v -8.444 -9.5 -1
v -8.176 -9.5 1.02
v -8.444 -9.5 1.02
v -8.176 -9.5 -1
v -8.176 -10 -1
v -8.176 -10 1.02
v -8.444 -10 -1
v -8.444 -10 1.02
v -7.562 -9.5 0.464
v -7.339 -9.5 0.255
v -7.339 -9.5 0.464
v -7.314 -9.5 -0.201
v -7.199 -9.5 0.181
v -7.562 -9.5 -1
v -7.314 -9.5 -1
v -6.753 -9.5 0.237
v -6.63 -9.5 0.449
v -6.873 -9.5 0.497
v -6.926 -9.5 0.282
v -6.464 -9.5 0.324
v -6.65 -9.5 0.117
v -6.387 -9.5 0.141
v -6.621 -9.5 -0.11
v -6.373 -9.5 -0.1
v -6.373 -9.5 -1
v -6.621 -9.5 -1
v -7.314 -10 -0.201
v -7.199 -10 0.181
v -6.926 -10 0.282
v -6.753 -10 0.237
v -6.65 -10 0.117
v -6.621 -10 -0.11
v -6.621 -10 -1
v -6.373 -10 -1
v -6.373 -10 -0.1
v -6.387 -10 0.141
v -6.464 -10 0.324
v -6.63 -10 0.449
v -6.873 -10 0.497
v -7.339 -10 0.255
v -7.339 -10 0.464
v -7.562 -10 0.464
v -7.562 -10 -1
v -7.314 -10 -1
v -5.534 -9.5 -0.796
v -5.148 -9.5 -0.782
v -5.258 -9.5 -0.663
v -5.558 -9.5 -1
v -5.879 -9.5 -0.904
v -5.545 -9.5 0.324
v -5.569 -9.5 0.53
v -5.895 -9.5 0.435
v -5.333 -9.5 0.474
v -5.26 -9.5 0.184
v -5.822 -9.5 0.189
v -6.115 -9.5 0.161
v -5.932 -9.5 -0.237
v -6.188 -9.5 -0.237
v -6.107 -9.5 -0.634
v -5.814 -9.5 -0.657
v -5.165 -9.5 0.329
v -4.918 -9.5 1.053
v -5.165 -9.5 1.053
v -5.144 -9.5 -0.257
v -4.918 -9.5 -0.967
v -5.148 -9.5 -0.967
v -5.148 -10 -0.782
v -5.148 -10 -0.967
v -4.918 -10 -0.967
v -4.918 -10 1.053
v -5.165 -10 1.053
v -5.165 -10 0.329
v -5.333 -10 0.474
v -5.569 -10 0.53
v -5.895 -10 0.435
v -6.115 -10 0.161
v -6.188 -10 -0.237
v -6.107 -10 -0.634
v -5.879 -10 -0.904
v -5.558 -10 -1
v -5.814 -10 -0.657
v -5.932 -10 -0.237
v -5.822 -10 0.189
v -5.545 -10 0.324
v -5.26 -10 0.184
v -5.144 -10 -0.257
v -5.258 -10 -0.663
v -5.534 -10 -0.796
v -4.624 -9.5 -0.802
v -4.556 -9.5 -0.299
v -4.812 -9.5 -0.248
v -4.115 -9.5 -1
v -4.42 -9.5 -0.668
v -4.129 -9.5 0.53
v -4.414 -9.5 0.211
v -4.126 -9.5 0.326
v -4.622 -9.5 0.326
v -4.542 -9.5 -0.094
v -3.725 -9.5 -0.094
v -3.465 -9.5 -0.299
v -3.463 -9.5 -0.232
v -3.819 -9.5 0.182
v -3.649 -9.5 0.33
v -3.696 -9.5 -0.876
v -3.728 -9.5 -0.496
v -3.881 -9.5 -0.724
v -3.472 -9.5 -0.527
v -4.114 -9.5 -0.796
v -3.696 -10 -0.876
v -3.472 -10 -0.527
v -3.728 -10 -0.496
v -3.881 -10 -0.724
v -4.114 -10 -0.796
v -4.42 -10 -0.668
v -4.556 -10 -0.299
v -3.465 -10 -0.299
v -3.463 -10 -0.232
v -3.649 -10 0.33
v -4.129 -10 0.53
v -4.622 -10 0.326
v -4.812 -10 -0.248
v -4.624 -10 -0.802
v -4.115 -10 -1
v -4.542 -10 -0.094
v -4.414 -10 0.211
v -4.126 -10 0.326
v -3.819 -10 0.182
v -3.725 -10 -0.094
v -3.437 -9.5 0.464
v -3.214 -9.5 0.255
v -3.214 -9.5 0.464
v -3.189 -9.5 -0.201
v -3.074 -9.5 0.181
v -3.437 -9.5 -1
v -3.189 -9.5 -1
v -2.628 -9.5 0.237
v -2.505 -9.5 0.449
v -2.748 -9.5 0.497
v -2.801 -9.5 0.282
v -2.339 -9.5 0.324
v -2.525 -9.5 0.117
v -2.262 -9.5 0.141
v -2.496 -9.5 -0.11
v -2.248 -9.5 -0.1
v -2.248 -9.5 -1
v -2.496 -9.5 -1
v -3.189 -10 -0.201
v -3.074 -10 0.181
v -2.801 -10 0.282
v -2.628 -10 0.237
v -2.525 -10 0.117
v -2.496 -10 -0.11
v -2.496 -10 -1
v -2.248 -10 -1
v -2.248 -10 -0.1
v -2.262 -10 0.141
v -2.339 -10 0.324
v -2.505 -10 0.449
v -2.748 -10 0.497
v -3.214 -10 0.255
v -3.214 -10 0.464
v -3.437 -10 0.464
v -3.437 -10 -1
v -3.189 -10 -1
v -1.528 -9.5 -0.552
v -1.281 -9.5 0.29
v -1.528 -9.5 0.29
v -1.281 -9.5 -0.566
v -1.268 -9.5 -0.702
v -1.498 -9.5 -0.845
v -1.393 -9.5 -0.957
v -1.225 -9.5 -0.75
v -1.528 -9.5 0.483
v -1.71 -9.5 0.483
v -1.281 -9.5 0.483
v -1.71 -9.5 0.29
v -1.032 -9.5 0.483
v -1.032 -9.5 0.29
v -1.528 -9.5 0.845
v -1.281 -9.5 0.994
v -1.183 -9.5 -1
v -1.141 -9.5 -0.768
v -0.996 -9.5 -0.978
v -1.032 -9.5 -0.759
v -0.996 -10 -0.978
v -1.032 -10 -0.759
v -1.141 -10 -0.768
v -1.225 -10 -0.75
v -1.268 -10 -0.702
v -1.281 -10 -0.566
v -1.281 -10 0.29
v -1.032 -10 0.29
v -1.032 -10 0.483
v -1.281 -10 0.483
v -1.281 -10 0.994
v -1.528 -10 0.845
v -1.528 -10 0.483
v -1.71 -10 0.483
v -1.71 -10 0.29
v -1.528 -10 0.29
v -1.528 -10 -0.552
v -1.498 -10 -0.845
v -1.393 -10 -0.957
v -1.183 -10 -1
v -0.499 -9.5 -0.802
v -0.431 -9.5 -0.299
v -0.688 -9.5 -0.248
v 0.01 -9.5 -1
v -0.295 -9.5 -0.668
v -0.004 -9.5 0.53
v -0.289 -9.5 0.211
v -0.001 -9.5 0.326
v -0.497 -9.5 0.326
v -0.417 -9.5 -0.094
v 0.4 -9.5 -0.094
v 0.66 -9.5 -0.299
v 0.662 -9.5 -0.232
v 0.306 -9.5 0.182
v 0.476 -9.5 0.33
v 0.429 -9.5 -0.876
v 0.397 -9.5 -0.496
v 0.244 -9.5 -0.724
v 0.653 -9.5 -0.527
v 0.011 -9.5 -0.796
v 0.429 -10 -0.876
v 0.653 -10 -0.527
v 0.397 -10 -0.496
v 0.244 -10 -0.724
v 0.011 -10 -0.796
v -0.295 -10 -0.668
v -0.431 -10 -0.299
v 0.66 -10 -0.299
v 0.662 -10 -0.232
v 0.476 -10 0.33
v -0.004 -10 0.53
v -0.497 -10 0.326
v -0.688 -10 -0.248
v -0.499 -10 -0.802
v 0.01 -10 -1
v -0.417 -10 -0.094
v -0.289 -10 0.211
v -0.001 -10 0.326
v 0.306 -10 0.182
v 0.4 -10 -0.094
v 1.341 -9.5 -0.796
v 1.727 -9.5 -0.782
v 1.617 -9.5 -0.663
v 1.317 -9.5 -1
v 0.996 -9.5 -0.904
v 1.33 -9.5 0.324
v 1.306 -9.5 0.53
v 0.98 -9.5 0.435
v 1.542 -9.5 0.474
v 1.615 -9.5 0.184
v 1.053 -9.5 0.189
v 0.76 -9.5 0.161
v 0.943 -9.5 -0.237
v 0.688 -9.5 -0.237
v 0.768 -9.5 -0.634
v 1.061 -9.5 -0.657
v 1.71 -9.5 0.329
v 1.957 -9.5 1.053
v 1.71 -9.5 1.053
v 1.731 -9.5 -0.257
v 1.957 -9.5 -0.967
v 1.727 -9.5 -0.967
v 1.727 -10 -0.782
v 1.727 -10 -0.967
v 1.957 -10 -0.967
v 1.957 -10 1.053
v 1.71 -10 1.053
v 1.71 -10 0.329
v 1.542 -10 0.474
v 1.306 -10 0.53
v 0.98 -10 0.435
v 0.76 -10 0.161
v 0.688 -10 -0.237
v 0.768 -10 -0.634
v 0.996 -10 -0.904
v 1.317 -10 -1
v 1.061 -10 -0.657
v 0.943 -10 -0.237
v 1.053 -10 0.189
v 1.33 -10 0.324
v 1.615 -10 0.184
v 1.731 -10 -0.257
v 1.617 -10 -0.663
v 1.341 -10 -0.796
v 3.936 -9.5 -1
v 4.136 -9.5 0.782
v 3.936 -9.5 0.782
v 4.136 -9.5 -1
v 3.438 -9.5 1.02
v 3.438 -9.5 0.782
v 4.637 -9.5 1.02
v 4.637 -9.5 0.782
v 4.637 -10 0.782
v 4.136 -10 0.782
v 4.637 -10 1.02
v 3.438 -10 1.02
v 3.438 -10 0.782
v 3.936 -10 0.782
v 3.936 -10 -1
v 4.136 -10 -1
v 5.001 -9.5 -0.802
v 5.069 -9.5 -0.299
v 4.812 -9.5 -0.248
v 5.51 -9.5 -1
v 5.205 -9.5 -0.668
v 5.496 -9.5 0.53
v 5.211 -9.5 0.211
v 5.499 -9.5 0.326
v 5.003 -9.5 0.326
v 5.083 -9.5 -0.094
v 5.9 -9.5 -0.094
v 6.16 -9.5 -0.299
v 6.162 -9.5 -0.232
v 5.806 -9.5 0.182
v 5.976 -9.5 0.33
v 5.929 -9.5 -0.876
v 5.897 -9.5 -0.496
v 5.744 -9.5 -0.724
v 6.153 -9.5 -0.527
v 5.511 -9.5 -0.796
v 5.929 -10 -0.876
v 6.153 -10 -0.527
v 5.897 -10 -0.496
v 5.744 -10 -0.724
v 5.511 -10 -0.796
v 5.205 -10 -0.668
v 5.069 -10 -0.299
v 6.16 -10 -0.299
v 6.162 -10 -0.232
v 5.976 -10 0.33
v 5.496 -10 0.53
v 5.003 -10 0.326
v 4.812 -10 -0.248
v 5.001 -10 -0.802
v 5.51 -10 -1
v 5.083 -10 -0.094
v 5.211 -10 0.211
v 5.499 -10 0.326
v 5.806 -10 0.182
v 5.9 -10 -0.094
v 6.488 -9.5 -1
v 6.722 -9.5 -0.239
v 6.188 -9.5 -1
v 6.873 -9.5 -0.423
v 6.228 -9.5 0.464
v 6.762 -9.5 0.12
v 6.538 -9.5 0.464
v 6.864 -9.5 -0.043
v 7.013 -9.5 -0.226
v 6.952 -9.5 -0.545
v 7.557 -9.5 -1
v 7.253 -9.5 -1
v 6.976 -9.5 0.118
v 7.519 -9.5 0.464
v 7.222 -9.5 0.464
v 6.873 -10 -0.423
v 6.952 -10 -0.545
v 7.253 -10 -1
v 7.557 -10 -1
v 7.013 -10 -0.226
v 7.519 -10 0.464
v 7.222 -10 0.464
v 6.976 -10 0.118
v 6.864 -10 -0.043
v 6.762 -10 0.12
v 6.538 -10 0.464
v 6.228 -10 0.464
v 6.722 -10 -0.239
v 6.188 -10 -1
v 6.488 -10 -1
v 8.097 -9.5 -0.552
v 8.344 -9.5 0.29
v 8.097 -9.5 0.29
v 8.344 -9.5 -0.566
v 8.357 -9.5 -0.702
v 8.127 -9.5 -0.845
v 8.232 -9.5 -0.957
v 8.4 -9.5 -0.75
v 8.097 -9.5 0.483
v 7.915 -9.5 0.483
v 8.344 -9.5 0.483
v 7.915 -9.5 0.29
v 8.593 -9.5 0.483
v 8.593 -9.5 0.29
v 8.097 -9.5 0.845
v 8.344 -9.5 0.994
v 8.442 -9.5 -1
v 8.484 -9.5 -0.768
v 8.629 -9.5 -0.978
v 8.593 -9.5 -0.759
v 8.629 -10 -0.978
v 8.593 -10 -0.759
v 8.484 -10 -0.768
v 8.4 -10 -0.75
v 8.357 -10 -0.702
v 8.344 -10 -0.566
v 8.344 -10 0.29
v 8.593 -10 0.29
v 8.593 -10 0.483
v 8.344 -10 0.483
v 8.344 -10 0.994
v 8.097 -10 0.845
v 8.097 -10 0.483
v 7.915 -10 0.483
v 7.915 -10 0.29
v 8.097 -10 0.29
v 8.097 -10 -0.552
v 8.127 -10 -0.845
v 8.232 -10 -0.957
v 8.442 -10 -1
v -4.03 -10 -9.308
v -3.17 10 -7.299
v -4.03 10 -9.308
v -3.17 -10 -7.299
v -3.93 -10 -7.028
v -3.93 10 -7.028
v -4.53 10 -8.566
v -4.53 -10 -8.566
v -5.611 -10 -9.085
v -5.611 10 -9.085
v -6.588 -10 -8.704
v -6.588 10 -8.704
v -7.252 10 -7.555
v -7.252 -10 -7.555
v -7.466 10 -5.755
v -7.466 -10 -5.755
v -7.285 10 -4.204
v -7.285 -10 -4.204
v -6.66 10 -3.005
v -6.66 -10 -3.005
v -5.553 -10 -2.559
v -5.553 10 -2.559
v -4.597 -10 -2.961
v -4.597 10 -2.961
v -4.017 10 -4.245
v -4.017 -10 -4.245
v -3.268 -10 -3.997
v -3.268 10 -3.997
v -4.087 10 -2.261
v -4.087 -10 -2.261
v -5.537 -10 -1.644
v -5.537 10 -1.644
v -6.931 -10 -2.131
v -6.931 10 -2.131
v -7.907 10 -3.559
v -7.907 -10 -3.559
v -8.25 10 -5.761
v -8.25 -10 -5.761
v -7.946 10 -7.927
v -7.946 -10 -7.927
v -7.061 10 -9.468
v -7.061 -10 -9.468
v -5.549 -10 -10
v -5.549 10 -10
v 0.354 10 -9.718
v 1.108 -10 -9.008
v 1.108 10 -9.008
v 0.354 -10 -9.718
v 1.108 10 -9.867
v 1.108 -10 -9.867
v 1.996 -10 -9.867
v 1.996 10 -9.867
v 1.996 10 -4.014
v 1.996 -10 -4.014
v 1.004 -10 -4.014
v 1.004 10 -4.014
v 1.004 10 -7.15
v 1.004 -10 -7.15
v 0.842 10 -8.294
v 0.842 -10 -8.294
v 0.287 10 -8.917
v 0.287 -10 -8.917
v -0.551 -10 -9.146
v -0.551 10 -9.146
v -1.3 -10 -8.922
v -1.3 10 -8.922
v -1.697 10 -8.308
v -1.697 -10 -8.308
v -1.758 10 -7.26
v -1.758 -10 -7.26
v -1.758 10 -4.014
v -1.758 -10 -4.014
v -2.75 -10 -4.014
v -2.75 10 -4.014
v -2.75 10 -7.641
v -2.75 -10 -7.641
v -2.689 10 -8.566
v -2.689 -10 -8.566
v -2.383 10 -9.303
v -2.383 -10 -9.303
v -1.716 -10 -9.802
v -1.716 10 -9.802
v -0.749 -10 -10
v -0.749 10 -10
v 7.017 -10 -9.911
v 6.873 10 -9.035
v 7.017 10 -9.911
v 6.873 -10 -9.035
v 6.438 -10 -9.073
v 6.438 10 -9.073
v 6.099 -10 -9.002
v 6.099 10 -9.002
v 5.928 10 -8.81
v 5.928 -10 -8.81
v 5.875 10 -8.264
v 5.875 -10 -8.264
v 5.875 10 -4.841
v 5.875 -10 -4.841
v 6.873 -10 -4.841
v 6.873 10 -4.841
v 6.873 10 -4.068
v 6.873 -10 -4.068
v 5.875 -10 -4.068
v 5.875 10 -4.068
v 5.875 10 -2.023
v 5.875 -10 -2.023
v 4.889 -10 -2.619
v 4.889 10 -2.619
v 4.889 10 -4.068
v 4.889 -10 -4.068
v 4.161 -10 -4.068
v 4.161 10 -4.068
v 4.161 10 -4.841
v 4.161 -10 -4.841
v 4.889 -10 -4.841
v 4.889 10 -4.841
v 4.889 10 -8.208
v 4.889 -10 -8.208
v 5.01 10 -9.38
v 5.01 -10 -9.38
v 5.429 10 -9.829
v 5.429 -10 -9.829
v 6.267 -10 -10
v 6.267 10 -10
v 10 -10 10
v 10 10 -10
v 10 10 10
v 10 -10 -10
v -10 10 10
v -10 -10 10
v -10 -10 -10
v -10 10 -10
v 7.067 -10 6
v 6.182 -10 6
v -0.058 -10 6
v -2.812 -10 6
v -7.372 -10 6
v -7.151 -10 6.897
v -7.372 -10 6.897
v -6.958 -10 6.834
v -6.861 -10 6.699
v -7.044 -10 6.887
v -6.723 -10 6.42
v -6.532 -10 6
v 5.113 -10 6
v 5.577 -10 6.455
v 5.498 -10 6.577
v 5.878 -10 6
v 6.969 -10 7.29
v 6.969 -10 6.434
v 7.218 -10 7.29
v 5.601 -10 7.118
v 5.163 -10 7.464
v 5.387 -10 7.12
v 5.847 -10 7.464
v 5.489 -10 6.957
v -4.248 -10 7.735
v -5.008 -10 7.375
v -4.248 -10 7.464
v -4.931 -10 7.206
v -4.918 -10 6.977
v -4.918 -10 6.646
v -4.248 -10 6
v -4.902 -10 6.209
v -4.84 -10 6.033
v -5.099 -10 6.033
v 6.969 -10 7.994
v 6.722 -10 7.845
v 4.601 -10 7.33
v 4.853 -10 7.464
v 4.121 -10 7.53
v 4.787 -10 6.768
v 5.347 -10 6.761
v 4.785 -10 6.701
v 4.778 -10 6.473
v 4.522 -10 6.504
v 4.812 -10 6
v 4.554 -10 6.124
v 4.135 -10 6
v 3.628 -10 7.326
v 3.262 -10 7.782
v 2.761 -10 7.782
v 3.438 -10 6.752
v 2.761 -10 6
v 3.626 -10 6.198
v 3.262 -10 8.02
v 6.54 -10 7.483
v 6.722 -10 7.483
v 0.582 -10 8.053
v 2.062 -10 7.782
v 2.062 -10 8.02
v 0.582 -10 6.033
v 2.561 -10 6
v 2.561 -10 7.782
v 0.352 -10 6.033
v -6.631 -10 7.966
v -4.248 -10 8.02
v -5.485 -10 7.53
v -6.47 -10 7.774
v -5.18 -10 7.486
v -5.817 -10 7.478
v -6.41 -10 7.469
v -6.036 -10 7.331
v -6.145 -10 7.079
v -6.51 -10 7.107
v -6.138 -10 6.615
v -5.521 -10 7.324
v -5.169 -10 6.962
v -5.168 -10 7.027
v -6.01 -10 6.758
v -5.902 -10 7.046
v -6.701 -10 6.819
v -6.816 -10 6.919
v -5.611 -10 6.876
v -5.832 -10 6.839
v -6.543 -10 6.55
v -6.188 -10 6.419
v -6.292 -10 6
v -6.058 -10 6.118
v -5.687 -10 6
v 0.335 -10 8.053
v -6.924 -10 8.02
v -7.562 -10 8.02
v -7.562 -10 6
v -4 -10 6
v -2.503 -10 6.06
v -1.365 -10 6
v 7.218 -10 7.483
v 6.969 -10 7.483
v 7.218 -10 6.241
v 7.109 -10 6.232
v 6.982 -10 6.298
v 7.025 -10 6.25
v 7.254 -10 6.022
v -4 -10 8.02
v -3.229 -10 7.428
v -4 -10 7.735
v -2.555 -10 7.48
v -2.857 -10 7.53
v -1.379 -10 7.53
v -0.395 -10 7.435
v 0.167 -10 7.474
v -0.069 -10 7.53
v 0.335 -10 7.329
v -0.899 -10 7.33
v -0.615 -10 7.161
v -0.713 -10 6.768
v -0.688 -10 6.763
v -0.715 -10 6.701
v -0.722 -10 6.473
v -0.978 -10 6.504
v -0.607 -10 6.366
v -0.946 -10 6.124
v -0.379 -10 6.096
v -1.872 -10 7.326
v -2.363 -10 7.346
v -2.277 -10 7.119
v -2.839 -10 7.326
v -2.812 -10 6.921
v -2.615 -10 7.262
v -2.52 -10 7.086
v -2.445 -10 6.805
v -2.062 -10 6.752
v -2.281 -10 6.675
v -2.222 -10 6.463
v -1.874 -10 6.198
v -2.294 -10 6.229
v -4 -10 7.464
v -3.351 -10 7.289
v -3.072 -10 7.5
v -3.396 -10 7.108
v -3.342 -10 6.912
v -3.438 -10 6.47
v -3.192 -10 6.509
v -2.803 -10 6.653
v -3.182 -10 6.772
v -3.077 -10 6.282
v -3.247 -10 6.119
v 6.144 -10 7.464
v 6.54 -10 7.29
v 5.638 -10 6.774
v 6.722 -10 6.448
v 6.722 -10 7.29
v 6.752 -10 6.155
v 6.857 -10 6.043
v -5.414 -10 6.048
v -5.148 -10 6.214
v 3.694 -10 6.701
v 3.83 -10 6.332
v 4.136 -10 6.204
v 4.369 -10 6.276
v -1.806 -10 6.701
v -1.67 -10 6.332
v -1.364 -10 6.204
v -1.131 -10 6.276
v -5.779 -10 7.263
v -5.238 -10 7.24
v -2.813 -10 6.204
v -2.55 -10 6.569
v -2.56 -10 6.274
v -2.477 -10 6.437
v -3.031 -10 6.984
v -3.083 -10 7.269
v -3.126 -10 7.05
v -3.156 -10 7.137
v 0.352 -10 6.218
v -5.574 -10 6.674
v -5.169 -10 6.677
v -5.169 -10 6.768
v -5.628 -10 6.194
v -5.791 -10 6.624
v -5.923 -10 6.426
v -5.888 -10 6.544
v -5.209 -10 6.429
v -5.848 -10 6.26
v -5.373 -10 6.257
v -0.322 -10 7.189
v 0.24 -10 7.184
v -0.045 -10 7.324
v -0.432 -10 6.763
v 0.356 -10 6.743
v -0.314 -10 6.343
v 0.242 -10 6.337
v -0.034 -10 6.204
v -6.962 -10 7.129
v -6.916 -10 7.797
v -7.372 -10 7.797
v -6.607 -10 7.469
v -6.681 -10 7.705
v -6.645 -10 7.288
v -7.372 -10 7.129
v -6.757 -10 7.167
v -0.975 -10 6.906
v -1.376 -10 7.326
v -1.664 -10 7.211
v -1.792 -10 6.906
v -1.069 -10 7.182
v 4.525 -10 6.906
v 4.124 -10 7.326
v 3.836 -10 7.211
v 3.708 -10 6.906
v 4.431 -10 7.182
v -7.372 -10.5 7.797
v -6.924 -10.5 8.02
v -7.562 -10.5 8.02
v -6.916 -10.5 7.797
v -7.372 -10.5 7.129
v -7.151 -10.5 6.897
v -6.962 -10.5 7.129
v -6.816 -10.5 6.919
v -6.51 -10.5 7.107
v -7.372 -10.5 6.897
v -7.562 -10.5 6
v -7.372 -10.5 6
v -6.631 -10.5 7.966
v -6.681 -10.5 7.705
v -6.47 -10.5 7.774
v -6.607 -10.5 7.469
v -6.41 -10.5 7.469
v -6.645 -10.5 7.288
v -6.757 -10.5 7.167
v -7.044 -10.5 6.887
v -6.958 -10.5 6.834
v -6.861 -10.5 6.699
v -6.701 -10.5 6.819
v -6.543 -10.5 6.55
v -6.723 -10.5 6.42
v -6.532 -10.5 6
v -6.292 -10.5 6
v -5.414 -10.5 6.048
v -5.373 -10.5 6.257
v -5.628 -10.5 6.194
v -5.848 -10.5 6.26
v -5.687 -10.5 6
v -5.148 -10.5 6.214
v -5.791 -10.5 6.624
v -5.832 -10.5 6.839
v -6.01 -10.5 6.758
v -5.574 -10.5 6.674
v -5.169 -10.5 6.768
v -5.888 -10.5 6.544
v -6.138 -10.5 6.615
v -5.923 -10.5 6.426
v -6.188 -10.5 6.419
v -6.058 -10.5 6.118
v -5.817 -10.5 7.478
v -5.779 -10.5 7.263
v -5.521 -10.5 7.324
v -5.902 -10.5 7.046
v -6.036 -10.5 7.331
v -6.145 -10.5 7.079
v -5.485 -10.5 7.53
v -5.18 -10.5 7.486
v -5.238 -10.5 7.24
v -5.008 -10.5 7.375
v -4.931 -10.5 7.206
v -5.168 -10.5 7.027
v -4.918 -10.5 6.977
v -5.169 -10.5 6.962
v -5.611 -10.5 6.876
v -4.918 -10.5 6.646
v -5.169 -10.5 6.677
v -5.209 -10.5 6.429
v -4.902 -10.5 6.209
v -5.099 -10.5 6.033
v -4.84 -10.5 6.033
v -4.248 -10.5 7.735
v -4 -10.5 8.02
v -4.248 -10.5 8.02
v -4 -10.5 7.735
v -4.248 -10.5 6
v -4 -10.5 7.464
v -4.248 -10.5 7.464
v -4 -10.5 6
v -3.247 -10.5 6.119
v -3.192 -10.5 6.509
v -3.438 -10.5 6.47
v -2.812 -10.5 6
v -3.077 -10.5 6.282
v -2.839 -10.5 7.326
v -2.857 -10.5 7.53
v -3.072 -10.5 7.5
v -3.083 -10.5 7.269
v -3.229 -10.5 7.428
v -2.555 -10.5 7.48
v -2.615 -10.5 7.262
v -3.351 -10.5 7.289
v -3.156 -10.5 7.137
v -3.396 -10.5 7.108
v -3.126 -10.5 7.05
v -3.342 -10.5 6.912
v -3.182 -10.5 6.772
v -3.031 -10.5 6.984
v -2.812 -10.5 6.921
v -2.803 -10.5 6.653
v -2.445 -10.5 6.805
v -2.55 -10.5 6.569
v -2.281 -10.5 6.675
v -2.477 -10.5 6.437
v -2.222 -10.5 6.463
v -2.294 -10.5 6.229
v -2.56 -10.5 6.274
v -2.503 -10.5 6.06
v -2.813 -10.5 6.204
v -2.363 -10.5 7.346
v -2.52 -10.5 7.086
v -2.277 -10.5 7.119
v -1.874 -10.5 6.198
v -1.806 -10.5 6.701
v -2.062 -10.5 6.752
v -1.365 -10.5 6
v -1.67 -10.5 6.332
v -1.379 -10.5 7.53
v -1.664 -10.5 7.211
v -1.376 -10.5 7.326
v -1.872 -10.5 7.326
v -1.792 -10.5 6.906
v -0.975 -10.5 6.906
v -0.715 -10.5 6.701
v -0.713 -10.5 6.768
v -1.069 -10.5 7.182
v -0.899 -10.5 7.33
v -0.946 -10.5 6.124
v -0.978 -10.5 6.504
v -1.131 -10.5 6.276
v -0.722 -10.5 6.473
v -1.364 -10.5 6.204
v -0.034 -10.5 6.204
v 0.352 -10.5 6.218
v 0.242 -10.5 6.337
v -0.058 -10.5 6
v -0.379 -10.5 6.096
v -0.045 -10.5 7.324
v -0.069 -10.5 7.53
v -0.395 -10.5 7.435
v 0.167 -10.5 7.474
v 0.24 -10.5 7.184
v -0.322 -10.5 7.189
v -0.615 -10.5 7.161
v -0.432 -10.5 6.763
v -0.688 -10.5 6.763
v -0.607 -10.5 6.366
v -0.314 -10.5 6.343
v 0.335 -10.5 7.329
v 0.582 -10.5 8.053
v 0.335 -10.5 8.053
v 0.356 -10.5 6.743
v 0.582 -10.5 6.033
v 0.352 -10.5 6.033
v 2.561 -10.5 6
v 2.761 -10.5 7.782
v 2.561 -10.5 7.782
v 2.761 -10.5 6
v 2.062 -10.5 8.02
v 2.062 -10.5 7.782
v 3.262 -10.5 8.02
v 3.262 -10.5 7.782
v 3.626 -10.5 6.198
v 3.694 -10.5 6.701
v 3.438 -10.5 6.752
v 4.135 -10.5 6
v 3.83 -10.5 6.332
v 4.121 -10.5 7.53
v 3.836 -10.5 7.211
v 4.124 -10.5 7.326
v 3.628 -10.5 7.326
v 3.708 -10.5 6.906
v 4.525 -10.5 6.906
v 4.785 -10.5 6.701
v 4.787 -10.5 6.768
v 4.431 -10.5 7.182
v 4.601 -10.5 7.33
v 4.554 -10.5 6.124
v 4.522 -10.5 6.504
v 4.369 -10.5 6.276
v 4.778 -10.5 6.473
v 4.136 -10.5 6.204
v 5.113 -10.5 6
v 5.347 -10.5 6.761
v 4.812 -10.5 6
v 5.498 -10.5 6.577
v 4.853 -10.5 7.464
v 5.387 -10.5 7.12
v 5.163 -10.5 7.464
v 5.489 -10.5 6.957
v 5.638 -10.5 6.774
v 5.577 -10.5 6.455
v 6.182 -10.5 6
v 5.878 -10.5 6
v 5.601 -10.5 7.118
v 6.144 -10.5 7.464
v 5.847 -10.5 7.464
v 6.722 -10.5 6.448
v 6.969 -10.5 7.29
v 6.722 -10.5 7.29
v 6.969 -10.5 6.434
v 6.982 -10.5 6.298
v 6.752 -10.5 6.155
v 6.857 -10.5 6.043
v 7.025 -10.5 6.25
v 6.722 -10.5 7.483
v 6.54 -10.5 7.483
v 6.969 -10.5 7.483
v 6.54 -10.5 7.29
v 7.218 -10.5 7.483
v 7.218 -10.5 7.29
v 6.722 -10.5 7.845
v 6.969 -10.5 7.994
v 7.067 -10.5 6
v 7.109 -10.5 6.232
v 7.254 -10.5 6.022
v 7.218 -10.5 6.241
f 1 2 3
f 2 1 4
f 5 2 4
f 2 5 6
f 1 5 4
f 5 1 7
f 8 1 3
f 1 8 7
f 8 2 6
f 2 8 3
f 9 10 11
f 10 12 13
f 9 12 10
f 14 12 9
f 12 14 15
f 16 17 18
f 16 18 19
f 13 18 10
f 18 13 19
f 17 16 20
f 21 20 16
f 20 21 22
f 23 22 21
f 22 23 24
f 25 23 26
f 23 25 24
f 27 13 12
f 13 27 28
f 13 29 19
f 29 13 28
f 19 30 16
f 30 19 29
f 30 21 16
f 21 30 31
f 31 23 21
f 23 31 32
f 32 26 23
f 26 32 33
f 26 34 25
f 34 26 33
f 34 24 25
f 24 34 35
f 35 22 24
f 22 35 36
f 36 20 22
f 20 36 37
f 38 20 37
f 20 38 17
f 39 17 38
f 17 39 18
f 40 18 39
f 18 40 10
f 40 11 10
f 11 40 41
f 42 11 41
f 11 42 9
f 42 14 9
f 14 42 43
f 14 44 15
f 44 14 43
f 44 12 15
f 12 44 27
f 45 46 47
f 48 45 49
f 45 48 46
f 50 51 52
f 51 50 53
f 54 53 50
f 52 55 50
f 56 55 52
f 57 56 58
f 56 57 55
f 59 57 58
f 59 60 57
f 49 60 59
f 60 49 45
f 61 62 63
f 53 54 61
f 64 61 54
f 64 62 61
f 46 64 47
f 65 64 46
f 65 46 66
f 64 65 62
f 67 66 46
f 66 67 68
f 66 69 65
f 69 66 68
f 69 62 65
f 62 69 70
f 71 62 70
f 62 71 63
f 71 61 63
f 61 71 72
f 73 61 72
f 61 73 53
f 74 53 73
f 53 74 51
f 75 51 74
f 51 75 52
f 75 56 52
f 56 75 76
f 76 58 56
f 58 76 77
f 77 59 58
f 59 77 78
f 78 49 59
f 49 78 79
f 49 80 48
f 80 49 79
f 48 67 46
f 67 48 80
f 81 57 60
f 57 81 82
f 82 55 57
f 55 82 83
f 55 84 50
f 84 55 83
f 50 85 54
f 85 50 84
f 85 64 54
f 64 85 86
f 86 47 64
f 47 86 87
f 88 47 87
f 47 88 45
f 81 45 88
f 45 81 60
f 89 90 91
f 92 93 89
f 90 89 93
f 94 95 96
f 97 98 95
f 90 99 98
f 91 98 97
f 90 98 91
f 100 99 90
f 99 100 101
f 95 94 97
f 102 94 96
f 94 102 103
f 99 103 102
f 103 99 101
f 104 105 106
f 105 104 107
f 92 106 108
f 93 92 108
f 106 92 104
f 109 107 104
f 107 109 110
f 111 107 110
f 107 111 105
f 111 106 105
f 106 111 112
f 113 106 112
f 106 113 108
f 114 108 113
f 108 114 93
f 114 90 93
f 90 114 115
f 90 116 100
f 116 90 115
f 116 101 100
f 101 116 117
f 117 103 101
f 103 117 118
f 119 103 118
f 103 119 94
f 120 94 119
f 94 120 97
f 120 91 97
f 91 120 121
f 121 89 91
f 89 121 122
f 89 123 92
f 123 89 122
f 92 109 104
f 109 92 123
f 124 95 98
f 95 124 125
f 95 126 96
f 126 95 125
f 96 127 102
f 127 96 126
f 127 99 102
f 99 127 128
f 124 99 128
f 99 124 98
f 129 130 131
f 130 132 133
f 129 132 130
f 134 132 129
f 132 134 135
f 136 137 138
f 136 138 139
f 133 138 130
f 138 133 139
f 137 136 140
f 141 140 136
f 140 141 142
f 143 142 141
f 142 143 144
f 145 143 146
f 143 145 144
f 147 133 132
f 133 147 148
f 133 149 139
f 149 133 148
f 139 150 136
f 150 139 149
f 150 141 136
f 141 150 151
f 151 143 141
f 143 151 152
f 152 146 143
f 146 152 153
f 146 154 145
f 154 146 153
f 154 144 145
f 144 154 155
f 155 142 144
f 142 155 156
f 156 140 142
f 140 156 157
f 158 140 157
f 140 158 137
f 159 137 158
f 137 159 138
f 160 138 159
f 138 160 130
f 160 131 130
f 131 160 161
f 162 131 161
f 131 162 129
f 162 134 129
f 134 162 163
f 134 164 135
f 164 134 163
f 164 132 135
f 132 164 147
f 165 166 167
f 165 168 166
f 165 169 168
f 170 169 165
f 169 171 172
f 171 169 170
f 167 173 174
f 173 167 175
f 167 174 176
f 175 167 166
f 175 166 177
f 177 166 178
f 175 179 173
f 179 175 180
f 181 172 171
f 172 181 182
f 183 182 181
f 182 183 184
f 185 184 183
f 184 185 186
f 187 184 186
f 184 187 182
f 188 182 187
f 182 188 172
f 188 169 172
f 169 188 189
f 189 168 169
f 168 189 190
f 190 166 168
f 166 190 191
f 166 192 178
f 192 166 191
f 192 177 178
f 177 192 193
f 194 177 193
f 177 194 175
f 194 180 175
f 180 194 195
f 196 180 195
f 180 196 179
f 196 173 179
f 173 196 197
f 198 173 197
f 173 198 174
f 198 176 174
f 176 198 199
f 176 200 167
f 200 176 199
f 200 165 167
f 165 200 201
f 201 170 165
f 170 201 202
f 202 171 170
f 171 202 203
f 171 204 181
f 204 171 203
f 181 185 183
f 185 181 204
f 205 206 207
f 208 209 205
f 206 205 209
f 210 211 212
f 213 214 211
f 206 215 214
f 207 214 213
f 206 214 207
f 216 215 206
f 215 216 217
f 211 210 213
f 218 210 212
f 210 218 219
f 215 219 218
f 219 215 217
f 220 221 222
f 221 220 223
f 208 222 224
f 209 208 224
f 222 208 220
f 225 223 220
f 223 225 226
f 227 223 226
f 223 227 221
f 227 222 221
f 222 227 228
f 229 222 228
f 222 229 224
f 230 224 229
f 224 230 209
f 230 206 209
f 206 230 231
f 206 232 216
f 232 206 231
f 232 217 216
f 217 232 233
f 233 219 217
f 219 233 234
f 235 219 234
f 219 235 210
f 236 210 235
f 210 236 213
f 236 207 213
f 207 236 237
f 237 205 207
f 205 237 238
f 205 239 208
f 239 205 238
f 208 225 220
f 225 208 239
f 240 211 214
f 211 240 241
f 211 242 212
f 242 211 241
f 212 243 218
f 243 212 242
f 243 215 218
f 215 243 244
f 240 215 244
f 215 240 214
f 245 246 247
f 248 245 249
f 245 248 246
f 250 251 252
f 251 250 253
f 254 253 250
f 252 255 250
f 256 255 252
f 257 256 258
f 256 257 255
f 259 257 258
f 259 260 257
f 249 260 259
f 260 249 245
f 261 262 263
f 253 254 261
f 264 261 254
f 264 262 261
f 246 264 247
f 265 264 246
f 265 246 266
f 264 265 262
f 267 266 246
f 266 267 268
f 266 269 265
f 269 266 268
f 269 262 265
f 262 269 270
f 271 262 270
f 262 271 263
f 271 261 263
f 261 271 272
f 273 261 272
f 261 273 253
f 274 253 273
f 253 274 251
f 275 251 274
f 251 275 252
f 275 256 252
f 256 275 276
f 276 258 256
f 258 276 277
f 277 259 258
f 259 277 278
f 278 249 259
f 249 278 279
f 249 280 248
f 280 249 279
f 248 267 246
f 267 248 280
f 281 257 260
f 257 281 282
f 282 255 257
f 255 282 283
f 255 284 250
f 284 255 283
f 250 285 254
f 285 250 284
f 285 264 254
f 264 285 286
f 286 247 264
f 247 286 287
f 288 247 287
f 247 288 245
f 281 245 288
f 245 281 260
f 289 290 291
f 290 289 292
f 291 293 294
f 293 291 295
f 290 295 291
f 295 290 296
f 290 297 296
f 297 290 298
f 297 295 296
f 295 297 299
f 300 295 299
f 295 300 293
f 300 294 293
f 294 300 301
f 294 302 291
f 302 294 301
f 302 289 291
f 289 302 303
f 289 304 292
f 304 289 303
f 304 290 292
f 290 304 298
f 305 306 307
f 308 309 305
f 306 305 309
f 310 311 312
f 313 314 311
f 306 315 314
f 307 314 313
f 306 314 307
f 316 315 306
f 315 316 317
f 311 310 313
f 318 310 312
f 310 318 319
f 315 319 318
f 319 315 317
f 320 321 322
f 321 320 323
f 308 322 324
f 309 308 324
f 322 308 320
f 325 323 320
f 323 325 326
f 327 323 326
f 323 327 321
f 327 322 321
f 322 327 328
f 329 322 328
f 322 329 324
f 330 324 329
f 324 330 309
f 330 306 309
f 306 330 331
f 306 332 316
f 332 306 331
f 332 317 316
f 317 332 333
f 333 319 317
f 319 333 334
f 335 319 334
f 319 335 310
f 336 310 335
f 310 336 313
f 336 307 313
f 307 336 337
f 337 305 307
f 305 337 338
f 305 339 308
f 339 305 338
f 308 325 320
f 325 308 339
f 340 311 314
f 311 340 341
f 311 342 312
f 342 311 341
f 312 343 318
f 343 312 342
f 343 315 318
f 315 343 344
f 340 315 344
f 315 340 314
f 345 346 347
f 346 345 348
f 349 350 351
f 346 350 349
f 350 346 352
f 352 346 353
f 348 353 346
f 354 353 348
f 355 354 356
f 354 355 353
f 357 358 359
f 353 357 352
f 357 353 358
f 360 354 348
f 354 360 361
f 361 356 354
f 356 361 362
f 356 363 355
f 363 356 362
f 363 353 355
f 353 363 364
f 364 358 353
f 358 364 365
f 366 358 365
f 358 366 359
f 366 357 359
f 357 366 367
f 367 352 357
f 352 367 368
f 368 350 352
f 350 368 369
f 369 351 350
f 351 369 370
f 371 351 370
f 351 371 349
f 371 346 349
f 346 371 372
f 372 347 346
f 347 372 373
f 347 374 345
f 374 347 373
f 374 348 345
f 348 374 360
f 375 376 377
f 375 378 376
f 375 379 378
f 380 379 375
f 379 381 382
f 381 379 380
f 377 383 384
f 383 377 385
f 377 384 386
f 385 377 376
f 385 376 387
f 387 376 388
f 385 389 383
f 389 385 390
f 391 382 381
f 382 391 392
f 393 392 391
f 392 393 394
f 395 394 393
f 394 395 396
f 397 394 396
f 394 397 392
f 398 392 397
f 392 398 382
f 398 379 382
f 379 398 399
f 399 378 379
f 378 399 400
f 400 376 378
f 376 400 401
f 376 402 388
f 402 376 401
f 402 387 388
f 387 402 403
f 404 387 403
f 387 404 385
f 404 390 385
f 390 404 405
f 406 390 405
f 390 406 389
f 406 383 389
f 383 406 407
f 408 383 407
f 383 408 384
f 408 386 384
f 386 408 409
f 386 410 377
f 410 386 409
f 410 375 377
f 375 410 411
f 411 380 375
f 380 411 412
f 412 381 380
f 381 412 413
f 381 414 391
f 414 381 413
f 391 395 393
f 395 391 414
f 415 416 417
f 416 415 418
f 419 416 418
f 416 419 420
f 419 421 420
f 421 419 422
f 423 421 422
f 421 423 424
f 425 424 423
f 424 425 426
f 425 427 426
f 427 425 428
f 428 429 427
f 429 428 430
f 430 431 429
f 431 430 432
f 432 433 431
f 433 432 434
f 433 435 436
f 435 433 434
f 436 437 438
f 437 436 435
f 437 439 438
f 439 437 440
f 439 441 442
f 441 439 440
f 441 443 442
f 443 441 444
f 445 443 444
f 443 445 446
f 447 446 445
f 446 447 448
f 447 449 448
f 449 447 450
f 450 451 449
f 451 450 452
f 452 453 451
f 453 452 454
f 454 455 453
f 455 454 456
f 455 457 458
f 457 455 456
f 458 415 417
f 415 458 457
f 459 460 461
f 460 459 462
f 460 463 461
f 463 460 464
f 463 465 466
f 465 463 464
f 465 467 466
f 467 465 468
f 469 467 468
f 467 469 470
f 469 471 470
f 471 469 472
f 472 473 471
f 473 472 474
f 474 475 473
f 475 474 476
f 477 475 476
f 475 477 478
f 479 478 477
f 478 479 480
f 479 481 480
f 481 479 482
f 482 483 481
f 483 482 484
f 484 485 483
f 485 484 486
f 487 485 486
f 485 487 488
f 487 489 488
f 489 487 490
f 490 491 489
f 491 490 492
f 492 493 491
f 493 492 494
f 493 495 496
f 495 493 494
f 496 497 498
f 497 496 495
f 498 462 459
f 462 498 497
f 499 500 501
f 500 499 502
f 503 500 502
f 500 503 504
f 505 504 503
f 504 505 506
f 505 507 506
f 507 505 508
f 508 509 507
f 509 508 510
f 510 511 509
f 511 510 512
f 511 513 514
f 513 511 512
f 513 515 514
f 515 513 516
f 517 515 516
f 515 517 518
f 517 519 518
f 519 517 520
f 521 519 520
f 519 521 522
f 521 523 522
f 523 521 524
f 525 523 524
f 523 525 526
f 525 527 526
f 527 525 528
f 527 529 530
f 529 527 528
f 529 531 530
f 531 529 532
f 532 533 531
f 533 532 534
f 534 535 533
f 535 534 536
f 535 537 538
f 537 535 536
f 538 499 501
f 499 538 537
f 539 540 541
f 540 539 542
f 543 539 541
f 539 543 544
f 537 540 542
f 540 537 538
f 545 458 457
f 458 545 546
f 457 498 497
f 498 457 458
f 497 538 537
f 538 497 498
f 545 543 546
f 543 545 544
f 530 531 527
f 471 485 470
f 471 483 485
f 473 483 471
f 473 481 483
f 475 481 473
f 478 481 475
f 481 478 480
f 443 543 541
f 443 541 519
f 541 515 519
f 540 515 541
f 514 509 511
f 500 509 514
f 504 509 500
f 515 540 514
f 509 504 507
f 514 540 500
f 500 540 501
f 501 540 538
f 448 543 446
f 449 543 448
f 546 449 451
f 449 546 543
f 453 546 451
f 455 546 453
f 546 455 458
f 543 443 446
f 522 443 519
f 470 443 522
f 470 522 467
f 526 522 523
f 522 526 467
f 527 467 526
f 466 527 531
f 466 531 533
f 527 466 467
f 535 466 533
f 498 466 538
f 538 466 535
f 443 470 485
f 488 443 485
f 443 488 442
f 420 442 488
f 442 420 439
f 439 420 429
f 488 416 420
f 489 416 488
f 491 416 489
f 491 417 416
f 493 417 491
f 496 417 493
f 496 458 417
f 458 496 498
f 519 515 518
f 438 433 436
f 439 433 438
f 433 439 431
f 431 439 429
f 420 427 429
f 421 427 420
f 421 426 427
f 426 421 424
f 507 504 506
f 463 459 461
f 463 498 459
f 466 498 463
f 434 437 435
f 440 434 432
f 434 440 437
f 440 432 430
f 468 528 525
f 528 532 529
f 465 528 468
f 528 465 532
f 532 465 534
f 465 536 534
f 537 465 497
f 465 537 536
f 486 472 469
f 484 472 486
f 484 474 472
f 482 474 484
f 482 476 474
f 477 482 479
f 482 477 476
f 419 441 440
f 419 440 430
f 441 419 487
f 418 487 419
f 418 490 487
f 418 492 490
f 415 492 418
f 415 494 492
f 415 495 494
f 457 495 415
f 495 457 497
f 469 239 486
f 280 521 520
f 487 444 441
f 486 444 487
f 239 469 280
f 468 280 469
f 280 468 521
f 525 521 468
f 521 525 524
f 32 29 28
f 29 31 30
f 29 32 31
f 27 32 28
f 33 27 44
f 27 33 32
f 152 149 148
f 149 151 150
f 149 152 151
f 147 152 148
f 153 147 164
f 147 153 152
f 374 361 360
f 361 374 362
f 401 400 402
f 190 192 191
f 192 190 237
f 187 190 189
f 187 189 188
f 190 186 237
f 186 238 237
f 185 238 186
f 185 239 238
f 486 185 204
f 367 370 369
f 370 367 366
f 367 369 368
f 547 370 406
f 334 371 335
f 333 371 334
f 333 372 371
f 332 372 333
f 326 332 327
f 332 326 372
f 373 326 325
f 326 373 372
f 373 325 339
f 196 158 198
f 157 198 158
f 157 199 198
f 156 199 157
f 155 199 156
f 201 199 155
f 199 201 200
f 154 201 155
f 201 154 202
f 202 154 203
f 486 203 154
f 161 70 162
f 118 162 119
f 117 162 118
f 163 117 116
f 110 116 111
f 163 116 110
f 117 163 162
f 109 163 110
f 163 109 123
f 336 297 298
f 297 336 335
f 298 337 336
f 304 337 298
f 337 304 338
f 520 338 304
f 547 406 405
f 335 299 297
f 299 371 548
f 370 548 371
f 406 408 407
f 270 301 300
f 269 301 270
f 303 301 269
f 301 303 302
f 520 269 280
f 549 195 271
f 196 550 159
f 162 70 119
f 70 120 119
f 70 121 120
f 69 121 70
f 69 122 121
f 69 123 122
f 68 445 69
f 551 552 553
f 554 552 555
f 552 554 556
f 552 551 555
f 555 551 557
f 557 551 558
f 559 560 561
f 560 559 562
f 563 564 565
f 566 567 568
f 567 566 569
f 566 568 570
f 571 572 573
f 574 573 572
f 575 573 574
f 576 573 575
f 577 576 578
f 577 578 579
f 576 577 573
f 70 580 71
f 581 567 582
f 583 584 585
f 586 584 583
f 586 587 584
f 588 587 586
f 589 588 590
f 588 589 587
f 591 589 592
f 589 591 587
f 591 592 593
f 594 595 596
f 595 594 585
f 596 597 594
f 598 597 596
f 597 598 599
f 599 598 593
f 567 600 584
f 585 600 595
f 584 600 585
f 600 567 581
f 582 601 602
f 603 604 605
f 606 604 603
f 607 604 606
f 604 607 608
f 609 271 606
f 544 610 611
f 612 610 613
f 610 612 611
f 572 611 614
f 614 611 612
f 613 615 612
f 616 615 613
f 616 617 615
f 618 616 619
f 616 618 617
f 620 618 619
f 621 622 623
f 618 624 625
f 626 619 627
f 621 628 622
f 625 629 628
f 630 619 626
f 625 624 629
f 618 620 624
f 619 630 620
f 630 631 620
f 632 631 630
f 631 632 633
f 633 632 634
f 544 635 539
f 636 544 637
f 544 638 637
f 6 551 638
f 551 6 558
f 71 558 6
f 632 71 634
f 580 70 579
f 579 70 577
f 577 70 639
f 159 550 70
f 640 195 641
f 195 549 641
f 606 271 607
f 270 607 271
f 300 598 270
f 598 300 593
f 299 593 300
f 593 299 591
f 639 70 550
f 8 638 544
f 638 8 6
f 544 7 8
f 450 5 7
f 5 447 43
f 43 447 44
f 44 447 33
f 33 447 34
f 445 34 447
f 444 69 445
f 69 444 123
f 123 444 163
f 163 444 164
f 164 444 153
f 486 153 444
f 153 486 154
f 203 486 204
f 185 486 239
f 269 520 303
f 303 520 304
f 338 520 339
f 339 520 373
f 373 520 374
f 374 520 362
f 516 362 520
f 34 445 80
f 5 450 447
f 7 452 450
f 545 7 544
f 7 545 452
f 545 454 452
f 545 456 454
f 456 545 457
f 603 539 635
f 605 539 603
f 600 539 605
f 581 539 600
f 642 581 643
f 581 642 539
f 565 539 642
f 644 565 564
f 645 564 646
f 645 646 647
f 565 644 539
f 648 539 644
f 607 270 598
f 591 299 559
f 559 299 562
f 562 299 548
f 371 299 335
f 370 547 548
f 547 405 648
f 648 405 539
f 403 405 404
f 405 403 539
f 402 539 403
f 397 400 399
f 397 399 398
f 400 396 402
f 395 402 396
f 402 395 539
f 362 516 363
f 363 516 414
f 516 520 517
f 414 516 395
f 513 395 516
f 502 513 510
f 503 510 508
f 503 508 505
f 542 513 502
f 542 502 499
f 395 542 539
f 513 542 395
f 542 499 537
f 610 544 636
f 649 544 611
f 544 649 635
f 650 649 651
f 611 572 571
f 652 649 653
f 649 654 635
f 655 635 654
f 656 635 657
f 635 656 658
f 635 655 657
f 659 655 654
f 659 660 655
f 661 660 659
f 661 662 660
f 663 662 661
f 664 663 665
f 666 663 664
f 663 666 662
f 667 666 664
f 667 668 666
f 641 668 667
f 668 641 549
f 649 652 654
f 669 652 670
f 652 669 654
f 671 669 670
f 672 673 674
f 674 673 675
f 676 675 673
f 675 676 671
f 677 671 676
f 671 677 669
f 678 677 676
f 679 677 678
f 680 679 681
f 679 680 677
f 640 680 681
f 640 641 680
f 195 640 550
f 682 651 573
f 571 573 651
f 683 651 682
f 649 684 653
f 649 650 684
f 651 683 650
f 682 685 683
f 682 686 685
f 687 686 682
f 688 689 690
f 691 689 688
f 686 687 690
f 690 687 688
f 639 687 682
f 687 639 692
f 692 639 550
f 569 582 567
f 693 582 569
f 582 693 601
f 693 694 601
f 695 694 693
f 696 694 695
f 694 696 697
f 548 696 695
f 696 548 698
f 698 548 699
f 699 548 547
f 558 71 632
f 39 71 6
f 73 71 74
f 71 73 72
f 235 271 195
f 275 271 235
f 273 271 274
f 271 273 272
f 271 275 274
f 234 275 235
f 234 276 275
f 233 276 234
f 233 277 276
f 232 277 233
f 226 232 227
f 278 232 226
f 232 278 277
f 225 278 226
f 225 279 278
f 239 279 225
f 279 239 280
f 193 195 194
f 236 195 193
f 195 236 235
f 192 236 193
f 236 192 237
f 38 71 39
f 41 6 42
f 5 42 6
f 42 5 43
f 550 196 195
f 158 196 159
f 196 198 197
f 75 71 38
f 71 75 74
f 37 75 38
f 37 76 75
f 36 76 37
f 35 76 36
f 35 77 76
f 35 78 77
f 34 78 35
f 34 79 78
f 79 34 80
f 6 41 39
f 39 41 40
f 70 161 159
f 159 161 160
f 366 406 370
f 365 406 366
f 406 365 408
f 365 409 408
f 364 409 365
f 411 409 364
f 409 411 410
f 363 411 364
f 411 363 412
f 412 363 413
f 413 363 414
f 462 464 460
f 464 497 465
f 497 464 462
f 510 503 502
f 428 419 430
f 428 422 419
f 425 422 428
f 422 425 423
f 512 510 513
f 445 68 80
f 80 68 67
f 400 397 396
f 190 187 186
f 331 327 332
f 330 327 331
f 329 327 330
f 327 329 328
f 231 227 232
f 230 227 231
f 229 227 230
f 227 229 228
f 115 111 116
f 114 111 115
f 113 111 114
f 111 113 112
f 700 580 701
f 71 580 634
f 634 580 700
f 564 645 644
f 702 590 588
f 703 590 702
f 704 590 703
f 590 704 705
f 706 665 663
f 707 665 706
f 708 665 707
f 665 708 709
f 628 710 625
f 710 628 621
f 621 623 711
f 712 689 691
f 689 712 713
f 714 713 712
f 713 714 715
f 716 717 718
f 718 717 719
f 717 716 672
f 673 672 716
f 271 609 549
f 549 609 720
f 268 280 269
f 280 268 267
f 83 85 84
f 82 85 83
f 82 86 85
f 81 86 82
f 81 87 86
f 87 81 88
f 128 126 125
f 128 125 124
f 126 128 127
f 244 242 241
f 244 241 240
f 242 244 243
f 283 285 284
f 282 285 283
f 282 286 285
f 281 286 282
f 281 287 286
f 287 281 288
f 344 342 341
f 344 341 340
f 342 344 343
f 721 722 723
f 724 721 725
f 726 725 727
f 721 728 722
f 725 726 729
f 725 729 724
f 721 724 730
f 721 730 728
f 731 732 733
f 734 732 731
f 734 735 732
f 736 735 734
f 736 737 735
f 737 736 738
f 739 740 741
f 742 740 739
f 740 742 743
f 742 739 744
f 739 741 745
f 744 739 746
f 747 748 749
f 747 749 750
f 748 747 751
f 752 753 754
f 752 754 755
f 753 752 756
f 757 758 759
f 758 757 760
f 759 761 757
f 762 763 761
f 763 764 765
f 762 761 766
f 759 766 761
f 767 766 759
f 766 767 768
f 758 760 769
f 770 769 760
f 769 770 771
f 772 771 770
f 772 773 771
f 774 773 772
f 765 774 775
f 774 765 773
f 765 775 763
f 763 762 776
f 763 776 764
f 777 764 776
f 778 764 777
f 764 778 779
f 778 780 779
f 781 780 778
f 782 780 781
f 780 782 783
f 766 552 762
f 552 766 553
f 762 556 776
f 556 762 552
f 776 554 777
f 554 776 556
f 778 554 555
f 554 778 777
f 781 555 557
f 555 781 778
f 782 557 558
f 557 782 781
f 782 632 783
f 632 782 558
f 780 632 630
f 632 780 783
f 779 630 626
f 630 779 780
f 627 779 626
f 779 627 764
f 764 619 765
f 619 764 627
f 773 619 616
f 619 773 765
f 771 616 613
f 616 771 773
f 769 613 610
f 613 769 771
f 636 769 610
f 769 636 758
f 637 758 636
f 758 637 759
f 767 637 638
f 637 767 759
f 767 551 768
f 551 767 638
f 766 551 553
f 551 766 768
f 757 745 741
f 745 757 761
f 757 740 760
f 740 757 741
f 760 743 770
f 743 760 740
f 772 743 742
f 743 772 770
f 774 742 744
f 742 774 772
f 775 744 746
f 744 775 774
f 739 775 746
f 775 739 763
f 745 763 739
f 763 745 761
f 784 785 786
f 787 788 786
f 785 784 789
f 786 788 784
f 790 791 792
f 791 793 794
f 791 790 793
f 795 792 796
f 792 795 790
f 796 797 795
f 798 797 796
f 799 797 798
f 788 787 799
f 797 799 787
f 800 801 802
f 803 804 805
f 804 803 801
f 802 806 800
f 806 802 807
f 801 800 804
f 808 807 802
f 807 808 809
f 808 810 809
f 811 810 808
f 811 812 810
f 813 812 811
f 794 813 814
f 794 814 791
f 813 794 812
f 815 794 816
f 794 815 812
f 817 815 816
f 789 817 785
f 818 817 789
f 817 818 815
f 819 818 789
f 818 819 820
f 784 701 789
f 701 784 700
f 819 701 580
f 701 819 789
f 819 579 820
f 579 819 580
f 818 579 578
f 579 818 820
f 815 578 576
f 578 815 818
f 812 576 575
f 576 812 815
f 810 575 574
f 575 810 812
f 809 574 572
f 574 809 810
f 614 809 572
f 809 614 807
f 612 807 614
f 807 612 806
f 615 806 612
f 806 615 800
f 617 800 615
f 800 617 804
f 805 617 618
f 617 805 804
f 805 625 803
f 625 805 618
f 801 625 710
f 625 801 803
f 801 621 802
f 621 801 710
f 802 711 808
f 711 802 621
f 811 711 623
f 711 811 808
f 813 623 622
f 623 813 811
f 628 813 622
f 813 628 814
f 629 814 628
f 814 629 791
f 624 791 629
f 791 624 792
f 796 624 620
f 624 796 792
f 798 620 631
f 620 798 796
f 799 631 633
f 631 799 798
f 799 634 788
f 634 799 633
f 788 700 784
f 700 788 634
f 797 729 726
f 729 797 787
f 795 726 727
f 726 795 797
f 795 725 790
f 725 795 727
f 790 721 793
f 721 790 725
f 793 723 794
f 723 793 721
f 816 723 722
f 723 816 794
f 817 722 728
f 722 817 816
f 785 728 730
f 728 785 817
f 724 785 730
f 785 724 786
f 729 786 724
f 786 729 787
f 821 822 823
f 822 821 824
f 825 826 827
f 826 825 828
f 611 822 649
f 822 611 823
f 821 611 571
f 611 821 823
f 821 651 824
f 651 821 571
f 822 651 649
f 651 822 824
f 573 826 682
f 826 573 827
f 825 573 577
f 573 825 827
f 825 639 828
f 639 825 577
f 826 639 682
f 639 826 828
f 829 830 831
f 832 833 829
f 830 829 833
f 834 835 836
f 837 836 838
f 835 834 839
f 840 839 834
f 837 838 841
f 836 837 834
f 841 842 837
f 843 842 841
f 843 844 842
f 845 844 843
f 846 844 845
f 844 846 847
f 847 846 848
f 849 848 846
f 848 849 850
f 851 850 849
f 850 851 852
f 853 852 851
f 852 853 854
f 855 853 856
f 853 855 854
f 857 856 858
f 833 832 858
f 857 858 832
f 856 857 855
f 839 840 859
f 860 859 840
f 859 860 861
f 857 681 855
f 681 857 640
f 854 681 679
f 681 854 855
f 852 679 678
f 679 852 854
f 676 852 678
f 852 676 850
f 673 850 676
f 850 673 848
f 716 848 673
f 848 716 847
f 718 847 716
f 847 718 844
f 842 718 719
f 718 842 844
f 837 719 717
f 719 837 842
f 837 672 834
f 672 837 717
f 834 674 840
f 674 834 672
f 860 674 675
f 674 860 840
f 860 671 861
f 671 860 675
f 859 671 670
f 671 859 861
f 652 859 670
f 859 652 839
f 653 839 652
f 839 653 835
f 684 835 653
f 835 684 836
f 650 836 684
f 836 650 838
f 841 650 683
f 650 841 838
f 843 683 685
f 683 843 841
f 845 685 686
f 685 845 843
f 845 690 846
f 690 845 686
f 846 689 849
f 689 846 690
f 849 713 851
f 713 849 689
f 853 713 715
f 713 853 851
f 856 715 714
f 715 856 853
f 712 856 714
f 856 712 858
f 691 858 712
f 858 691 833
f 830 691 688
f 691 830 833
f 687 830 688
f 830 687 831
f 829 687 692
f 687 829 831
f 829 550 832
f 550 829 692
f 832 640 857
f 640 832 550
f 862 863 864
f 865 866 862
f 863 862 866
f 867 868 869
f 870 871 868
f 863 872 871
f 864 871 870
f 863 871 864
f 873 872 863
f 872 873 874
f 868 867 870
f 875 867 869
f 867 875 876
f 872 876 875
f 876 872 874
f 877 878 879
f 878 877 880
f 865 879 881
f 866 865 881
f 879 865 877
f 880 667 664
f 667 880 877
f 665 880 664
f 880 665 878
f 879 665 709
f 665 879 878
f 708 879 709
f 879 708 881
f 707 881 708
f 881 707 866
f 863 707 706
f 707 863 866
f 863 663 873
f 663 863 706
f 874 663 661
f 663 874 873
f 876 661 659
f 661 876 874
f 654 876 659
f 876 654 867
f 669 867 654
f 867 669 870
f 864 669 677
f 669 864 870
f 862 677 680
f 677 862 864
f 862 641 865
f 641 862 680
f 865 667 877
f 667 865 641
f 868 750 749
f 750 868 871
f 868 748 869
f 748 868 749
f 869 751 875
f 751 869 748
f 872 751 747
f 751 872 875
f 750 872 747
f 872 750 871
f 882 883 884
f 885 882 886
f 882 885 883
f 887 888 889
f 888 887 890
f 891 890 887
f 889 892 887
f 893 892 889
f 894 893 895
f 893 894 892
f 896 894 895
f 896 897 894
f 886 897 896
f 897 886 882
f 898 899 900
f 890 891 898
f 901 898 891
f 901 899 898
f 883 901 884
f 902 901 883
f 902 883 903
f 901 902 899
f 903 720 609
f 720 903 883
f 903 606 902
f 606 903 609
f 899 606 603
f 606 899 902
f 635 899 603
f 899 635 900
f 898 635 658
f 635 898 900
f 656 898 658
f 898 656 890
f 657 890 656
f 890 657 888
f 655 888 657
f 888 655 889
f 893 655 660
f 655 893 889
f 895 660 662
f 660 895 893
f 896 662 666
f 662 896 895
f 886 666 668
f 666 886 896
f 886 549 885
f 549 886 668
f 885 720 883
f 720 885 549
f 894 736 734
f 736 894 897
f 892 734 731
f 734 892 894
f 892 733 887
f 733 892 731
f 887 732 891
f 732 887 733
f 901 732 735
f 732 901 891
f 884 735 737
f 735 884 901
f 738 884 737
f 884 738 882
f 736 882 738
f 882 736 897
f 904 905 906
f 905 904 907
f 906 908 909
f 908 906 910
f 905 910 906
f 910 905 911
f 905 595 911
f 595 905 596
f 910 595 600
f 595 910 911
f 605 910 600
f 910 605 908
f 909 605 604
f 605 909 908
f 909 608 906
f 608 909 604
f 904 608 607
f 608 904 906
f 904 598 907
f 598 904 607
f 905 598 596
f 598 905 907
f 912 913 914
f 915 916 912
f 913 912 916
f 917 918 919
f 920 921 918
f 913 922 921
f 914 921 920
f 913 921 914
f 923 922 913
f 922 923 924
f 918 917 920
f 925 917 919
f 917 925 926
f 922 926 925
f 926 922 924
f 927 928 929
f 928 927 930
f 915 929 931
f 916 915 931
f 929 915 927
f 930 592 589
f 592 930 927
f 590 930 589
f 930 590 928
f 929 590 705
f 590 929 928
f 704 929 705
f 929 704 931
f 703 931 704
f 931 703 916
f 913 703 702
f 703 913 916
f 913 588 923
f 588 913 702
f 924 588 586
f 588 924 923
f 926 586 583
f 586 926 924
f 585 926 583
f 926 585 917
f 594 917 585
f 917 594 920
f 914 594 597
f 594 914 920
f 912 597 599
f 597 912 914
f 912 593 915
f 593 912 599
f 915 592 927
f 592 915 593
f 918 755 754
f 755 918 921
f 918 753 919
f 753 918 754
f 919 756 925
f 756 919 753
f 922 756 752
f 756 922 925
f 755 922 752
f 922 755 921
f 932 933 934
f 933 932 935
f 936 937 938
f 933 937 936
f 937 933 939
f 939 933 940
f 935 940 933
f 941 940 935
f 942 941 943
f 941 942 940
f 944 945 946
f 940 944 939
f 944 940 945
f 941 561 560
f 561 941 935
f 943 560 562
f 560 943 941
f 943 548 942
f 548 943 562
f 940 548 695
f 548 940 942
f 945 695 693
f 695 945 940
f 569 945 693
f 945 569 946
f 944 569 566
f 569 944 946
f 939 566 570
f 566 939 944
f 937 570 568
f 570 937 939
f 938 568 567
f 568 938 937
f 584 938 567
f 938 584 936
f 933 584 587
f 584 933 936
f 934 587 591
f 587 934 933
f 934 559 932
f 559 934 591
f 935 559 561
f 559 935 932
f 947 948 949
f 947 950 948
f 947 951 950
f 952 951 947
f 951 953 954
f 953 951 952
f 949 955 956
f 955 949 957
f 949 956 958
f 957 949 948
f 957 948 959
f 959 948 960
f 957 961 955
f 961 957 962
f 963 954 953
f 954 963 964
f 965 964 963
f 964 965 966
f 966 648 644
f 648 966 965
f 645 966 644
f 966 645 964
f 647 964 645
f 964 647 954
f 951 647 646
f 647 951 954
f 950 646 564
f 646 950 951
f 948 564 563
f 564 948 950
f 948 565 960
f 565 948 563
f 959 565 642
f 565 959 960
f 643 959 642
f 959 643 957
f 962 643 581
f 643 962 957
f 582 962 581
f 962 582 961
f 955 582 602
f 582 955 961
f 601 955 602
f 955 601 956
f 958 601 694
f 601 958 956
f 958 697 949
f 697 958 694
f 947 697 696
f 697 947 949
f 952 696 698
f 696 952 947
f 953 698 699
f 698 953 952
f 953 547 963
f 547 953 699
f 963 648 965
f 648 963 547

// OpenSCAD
/*
********************************************************
By Harlan Martin
harlan@sutlog.com
January 2012

	1...	The quote " symbol cannot be inserted into a string alone
		Either use \"  or just the single quote' will show as "

	2...	The \ is used for special text characters, so use the bar | to 
		show the back slash \ 
------------------------------------------------------------------------------------
	Usage...

	write("my text",t=3,h=5,center=true);

	(t) (optional) The thickness of the letters in mm. 
		The default is 1mm if not specified

	(h)(optional)  The height of the letters in mm. 
		The default is 8mm if not specified

	(center) (optional) Centers the text at default coordinates.

	Put the files (write.scad) and (letters.dfx) in the 
		working directory with your project
------------------------------------------------------------------------------------------



********************************************************
*/
include <Write.scad>

// remember when centered, the text is centered on the [x,y,z] vector
// if you place centered text on the surface,half is inside, half is out
difference(){
	translate([0,0,0])
	cube(20,center=true);

	translate([0,-10,0])
	rotate(90,[1,0,0])
	write("Indented Text",h=2,t=1,center=true);

	translate([0,0,-6])
	rotate(90,[1,0,0])
	write("Cut",h=8,t=30,center=true);
}

translate([0,-10,7])
rotate(90,[1,0,0])
write("Raised Text",h=2,t=1,center=true);
